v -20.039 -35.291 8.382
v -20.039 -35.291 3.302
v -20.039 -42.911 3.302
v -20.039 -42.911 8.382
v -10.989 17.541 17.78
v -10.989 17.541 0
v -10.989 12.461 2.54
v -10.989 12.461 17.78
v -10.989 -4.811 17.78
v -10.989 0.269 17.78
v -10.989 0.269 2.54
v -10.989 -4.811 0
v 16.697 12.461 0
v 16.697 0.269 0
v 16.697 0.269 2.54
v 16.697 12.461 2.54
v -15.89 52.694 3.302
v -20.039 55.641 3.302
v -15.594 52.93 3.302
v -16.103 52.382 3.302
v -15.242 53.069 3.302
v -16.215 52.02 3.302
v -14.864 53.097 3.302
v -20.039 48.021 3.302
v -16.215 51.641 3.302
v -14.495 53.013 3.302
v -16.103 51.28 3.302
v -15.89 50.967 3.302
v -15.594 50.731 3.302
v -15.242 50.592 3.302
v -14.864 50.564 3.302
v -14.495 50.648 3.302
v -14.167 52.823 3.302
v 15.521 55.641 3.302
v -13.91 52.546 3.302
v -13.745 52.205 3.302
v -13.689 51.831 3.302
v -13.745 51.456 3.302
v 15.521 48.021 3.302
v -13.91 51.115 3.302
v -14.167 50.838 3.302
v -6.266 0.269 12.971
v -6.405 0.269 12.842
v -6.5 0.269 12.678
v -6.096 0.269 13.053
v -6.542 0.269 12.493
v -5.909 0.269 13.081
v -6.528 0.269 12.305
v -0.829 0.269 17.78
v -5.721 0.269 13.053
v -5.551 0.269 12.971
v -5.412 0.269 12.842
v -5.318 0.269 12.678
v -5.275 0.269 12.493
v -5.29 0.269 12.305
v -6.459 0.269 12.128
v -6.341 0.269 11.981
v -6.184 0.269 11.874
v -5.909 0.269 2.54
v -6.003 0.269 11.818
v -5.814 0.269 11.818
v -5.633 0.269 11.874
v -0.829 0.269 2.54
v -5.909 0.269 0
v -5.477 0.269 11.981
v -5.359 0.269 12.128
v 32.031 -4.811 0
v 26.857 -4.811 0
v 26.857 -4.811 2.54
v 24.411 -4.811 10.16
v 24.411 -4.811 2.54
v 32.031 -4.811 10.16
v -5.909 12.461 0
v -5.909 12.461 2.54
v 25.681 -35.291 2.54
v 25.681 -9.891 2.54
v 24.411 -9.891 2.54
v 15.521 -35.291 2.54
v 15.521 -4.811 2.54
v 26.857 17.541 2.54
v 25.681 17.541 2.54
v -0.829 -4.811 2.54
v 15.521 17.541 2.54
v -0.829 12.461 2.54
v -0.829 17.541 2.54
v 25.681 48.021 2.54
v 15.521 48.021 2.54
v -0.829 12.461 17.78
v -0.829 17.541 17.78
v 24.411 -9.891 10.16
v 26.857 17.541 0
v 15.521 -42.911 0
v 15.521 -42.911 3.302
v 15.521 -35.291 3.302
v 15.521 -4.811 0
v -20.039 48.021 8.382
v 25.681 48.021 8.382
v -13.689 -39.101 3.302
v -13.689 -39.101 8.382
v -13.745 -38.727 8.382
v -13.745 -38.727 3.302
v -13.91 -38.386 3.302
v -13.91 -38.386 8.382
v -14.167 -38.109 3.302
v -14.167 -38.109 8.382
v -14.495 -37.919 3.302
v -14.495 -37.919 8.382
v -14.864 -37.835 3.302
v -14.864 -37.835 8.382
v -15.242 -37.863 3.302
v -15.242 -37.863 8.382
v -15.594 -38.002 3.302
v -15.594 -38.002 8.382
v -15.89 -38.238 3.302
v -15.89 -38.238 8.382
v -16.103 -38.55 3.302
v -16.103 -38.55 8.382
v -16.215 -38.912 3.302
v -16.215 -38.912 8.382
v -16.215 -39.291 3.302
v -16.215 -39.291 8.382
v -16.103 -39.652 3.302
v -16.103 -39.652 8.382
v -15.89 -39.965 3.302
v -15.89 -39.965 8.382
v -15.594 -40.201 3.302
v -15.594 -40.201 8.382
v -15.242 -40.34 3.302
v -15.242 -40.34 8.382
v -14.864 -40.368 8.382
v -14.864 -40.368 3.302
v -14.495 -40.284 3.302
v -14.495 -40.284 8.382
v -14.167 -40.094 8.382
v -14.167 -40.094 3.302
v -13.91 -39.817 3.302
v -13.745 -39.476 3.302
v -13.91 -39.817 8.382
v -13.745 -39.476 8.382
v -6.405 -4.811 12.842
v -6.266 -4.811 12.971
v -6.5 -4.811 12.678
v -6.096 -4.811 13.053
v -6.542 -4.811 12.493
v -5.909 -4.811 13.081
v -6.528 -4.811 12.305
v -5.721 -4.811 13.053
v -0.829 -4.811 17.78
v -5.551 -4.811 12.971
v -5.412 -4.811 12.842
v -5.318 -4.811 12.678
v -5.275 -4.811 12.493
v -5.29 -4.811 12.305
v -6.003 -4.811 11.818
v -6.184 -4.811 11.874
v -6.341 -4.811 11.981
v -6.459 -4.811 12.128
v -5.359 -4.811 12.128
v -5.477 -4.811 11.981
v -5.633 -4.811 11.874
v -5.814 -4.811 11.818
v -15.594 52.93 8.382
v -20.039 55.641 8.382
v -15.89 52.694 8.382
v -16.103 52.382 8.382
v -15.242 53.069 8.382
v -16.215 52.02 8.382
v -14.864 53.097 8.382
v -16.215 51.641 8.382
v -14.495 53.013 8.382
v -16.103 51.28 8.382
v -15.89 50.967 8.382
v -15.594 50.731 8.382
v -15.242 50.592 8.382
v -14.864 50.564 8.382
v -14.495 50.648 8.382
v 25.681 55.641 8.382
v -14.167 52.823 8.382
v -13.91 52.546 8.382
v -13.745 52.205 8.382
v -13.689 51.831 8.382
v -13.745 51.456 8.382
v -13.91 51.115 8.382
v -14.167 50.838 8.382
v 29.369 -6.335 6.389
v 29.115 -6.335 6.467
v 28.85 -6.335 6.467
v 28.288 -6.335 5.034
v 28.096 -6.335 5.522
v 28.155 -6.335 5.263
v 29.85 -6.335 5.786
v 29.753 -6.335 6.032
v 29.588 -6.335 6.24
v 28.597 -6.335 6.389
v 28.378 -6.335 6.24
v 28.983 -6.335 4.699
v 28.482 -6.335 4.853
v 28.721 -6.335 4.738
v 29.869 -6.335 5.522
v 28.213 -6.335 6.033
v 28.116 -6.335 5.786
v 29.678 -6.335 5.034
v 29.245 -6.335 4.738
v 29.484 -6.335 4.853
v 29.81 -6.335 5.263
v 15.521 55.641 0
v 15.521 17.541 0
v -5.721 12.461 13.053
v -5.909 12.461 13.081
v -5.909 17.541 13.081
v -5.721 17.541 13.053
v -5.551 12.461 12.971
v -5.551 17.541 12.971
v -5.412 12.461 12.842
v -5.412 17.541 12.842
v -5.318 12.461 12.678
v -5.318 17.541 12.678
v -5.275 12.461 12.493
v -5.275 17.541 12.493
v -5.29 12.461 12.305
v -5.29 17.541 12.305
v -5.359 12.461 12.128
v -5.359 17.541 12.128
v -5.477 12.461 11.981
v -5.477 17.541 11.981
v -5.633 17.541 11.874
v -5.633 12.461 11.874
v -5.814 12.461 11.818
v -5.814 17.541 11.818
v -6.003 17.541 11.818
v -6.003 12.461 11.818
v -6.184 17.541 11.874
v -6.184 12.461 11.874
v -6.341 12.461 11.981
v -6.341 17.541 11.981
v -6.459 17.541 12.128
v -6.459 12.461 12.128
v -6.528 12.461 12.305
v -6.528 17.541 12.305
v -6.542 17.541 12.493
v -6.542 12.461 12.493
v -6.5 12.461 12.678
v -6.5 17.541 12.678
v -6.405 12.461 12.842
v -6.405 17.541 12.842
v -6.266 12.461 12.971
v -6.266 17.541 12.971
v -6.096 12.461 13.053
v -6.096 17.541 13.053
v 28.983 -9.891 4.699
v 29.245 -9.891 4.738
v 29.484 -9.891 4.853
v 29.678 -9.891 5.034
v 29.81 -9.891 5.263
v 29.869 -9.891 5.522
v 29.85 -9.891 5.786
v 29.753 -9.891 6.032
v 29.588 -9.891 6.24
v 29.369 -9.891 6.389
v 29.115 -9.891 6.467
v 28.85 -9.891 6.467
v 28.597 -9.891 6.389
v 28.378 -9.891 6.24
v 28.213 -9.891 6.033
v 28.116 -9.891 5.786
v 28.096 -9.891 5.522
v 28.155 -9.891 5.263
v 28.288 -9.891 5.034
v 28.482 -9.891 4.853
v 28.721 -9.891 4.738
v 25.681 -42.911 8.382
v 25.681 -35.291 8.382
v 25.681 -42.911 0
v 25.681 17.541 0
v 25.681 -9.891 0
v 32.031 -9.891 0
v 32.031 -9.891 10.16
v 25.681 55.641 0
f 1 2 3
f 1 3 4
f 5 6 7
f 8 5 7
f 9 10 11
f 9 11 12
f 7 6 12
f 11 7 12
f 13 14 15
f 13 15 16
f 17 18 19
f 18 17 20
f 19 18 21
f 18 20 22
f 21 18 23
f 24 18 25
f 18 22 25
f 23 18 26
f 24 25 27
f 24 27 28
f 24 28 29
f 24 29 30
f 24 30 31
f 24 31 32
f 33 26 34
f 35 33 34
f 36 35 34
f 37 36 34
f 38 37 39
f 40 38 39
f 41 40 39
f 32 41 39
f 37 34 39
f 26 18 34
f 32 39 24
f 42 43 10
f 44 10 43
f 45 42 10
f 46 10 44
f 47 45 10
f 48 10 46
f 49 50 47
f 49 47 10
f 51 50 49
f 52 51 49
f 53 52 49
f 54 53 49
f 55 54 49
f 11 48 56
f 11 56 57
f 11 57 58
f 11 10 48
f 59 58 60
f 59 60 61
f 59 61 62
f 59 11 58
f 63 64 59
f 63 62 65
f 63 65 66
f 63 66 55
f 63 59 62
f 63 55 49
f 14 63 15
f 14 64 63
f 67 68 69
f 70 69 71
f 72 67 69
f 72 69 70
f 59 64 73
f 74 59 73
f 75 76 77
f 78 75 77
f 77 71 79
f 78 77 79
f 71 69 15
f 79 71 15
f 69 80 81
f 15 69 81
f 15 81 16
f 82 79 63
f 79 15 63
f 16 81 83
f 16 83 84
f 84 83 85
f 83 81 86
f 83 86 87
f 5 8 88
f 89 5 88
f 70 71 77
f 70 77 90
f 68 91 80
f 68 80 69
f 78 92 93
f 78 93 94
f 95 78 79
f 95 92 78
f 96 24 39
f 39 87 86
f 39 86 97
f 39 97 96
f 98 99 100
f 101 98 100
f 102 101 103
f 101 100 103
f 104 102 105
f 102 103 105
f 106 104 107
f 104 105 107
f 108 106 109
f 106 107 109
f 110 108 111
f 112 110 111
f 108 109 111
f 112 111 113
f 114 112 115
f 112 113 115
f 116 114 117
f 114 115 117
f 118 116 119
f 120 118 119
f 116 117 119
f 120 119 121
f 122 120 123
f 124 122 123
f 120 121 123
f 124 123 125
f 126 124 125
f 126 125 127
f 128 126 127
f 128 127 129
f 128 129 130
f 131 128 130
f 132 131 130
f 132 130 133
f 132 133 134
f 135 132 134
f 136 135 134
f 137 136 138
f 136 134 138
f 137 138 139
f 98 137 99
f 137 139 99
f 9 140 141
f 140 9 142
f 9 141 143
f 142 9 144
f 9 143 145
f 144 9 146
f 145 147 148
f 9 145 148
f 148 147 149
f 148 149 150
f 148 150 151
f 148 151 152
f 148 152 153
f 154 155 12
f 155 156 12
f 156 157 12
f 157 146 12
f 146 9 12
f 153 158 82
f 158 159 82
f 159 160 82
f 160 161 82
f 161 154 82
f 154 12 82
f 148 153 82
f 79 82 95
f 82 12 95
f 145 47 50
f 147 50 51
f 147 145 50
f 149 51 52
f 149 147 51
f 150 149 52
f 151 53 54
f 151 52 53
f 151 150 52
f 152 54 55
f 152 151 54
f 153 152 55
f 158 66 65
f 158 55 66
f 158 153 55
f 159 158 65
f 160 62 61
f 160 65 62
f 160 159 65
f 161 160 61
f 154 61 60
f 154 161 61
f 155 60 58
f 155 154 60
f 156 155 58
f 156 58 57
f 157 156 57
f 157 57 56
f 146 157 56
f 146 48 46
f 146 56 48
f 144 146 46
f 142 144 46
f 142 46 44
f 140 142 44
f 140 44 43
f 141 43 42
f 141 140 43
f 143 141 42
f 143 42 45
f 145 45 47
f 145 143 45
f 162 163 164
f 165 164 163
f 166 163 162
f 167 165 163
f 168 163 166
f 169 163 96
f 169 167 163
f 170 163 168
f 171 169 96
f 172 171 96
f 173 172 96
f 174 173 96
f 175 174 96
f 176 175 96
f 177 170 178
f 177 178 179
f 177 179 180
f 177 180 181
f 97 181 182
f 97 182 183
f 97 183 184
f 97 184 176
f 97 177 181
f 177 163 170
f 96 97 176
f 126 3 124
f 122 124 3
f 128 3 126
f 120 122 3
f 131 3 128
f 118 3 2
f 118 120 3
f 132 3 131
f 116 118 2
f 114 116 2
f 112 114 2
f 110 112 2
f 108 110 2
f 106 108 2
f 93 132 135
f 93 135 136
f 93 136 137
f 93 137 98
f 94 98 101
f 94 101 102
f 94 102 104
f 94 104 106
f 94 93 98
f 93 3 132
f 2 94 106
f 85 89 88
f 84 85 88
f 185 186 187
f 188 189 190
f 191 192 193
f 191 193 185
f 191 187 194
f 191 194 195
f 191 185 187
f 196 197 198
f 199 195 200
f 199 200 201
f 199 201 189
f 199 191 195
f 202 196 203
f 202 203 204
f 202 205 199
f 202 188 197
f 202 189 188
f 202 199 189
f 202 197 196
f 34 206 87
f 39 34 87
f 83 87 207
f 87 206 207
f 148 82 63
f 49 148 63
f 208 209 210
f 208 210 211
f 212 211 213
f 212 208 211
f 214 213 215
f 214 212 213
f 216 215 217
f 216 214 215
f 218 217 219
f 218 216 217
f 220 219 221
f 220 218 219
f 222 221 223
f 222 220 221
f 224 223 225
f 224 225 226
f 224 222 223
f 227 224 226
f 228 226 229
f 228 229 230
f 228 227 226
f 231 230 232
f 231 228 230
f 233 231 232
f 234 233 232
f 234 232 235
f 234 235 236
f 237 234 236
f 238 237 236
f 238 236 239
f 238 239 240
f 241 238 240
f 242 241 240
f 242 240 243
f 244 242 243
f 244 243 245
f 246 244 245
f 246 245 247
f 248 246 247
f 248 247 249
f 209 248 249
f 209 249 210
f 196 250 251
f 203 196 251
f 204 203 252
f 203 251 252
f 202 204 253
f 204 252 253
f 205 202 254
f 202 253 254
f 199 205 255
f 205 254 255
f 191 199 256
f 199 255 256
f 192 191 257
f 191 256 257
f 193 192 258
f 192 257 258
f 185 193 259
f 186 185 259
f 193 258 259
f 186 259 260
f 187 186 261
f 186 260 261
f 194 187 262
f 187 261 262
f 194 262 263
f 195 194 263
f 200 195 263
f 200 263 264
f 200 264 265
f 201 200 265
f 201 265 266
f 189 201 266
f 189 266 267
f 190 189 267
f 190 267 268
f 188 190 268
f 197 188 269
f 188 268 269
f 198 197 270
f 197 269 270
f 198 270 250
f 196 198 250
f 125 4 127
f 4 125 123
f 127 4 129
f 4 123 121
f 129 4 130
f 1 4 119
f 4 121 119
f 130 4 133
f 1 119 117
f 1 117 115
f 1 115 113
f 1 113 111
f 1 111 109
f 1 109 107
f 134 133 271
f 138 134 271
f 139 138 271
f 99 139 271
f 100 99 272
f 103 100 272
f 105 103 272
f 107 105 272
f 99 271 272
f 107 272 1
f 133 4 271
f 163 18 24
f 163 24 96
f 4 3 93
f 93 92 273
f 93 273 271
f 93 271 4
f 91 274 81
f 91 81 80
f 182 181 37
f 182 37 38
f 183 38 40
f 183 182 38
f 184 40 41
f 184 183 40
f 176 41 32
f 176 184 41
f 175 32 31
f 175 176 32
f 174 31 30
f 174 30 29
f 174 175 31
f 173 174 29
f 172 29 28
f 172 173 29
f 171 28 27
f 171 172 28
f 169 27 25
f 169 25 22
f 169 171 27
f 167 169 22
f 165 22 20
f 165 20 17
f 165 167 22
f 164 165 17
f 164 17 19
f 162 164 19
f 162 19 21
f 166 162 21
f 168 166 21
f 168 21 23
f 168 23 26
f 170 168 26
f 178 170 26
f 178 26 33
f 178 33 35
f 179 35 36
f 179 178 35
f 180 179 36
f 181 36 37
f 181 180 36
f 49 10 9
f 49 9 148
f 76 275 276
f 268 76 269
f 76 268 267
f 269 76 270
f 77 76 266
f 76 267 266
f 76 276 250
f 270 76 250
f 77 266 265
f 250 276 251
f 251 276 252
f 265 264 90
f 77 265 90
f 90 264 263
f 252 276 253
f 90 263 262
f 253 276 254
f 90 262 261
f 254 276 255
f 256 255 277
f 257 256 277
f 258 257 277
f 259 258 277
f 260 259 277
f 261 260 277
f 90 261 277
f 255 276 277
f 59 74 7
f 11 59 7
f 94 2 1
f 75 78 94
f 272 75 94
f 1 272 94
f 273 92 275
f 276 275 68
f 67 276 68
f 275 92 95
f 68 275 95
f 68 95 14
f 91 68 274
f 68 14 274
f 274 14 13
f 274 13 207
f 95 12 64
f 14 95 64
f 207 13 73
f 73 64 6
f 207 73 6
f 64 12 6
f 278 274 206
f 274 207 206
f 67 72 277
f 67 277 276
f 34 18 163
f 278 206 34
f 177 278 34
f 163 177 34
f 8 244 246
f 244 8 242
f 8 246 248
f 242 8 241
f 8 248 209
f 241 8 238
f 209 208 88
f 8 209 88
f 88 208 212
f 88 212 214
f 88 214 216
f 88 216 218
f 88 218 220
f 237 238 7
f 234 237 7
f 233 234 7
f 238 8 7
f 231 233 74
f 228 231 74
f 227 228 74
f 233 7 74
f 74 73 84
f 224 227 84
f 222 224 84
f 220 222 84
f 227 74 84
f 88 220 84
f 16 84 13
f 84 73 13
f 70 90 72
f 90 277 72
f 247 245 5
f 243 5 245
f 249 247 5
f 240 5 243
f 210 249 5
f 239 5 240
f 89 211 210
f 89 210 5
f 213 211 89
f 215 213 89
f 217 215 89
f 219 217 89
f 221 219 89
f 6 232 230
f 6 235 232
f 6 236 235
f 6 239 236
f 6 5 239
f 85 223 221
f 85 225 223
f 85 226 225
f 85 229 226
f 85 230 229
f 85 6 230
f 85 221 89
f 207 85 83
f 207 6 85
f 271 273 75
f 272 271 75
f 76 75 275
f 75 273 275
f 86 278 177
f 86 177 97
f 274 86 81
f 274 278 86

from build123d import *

# Parameters (mm, degrees)
SKETCH2_W           = 22.606
SKETCH2_H           = 12.192
BOSS_EXTRUDE2_DEPTH = 2.54
SKETCH3_W           = 10.16
SKETCH3_H           = 5.08
BOSS_EXTRUDE3_DEPTH = 15.24
SKETCH5_W           = 10.16
SKETCH5_H           = 7.62
BOSS_EXTRUDE4_DEPTH = 5.842
SKETCH6_W           = 5.08
SKETCH6_H           = 7.62
BOSS_EXTRUDE5_DEPTH = 35.56
SKETCH8_R           = 1.27
CUT_EXTRUDE2_DEPTH  = 5.08
CUT_EXTRUDE4_START  = -22.352
SKETCH4_R           = 0.635
CUT_EXTRUDE4_DEPTH  = 22.352
SKETCH16_W          = 10.16
SKETCH16_H          = 5.08
BOSS_EXTRUDE8_DEPTH = 6.35
SKETCH20_R          = 0.889
CUT_EXTRUDE7_DEPTH  = 3.556
SKETCH21_W          = 7.62
SKETCH21_H          = 5.08
BOSS_EXTRUDE9_DEPTH = 1.27


with BuildPart() as part:
    # Sketch2 → Boss-Extrude2 (new body)
    with BuildSketch(Plane.XY):
        Polygon((26.857381616, 17.540573563), (26.857381616, -4.811426437), (25.680950898, -4.811426437), (25.680950898, -42.911426437), (15.520950898, -42.911426437), (15.520950898, -4.811426437), (-10.988618384, -4.811426437), (-10.988618384, 17.540573563), (15.520950898, 17.540573563), (15.520950898, 55.640573563), (25.680950898, 55.640573563), (25.680950898, 17.540573563), align=None)
        with Locations((5.394381616, 6.364573563)):
            Rectangle(SKETCH2_W, SKETCH2_H, mode=Mode.SUBTRACT)
    extrude(amount=BOSS_EXTRUDE2_DEPTH)

    # Sketch3 → Boss-Extrude3 (add)
    with BuildSketch(Plane.XY.offset(2.54)):
        with Locations((-5.908618384, -2.271426437)):
            Rectangle(SKETCH3_W, SKETCH3_H)
    boss_extrude3 = extrude(amount=BOSS_EXTRUDE3_DEPTH)

    # Sketch5 → Boss-Extrude4 (add)
    with BuildSketch(Plane.XY.offset(2.54)):
        with Locations((20.600950898, -39.101426437)):
            Rectangle(SKETCH5_W, SKETCH5_H)
    boss_extrude4 = extrude(amount=BOSS_EXTRUDE4_DEPTH)

    # Sketch6 → Boss-Extrude5 (add)
    with BuildSketch(Plane.ZY.offset(-15.520950898)):
        with Locations((5.842, -39.101426437)):
            Rectangle(SKETCH6_W, SKETCH6_H)
    boss_extrude5 = extrude(amount=BOSS_EXTRUDE5_DEPTH)

    # Sketch8 → Cut-Extrude2 (cut)
    with BuildSketch(Plane.XY.offset(8.382)):
        with Locations((-14.959049102, -39.101426437)):
            Circle(SKETCH8_R)
    cut_extrude2 = extrude(amount=-CUT_EXTRUDE2_DEPTH, mode=Mode.SUBTRACT)

    # Mirror6: Boss-Extrude3, Boss-Extrude4, Boss-Extrude5, Cut-Extrude2 across plane
    add(boss_extrude3.mirror(Plane.ZX.offset(6.364573563)))
    add(boss_extrude4.mirror(Plane.ZX.offset(6.364573563)))
    add(boss_extrude5.mirror(Plane.ZX.offset(6.364573563)))
    add(cut_extrude2.mirror(Plane.ZX.offset(6.364573563)), mode=Mode.SUBTRACT)

    # Sketch4 → Cut-Extrude4 (cut)
    with BuildSketch(Plane(origin=(0, 17.540573563, 0), x_dir=(1, 0, 0), z_dir=(0, 1, 0)).offset(CUT_EXTRUDE4_START)):
        with Locations(Location((-5.908618384, -12.446, 0), (0, 0, 270))):
            Circle(SKETCH4_R)
    extrude(amount=CUT_EXTRUDE4_DEPTH, mode=Mode.SUBTRACT)

    # Sketch16 → Boss-Extrude8 (add)
    with BuildSketch(Plane(origin=(25.680950898, 0, 0), x_dir=(0, 0, -1), z_dir=(1, 0, 0))):
        with Locations((-5.08, -7.351426437)):
            Rectangle(SKETCH16_W, SKETCH16_H)
    extrude(amount=BOSS_EXTRUDE8_DEPTH)

    # Sketch20 → Cut-Extrude7 (cut)
    with BuildSketch(Plane(origin=(0, -9.891426437, 0), x_dir=(-1, 0, 0), z_dir=(0, -1, 0))):
        with Locations(Location((-28.982950898, -5.588, 0), (0, 0, 90))):
            Circle(SKETCH20_R)
    extrude(amount=-CUT_EXTRUDE7_DEPTH, mode=Mode.SUBTRACT)

    # Sketch21 → Boss-Extrude9 (add)
    with BuildSketch(Plane.ZY.offset(-25.680950898)):
        with Locations((6.35, -7.351426437)):
            Rectangle(SKETCH21_W, SKETCH21_H)
    extrude(amount=BOSS_EXTRUDE9_DEPTH)


solid = part.part
